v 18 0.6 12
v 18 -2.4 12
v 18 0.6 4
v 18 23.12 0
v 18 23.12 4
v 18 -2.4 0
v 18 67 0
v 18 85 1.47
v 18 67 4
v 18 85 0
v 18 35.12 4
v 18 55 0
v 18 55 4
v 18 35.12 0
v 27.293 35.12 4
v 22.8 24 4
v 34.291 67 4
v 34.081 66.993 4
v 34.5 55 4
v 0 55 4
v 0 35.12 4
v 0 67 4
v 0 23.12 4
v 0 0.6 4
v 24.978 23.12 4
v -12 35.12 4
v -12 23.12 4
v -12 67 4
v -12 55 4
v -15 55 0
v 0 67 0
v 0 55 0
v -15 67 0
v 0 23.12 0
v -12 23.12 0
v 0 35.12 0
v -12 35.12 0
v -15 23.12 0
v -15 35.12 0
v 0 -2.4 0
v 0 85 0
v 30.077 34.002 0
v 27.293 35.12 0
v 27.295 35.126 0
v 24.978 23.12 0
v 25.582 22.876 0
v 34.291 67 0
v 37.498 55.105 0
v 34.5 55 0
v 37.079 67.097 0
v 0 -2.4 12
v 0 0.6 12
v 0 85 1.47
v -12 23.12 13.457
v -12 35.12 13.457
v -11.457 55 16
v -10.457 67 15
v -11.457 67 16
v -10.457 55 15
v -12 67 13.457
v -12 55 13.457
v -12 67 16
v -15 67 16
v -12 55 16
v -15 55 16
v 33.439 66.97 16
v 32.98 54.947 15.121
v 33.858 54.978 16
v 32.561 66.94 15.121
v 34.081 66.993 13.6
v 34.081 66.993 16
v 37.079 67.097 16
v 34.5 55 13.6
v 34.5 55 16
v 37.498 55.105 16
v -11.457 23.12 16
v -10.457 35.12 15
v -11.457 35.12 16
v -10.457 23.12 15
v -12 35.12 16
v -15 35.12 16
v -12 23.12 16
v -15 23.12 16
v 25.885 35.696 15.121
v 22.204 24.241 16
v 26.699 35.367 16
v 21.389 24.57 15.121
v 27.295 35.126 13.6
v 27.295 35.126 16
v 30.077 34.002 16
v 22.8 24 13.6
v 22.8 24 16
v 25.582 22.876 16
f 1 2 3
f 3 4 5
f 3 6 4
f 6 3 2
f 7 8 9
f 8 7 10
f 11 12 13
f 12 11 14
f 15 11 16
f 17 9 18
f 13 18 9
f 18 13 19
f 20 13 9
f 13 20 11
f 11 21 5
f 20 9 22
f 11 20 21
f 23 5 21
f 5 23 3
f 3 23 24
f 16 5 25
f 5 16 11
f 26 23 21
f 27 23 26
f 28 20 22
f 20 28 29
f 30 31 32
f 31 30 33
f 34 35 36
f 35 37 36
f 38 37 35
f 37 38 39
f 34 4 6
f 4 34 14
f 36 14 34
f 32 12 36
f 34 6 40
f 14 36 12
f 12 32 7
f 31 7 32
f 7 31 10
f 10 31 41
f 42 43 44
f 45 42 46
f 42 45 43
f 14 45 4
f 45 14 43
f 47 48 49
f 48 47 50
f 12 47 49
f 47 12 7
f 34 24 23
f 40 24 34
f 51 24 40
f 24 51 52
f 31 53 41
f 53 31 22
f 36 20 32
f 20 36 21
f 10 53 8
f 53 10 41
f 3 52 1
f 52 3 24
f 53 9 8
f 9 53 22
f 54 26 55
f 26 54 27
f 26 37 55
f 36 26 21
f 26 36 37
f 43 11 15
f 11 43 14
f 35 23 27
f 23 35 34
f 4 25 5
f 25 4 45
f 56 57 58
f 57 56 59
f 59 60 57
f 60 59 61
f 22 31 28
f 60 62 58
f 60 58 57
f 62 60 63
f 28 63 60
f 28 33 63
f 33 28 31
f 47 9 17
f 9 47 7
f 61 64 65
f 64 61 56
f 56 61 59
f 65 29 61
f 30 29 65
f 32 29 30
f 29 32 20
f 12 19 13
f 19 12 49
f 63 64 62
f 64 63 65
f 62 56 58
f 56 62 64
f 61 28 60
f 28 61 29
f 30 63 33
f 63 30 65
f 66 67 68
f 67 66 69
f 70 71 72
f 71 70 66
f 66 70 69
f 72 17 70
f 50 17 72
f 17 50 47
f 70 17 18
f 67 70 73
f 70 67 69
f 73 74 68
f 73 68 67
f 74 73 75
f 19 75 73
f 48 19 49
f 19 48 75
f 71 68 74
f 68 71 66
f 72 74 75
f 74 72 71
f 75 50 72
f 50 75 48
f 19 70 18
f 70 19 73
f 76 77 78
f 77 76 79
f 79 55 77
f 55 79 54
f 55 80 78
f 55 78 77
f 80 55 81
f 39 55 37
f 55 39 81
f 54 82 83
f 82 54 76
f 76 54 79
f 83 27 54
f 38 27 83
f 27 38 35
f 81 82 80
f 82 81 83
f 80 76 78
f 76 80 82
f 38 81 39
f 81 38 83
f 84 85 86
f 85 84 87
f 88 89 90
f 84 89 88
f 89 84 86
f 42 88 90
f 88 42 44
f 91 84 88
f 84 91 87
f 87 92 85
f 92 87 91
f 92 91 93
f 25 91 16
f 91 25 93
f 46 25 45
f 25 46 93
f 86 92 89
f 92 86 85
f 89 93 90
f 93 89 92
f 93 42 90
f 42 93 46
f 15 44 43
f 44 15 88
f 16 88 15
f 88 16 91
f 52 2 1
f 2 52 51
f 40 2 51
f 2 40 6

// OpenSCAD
$fn = 90;

difference() {
    handle();

    #translate([-10, 46, 28]) rotate([180, 0, 180]) h();
    #translate([30, 46, 28]) rotate([180, 0, 180]) h();
}


module h() {
    translate([0,4,24]) {
        difference() {
            //rotate([-90,0,0]) import("Hook_single.stl");
            translate([0,11,-0.9]) cylinder(d = 2.5, h = 9);
            translate([0,0,-2]) {
                translate([0,11,-0.9]) cylinder(d = 3, h = 9);
                translate([0,11,8]) cylinder(d = 4.6, h = 10);
            }
        }
    }
}

module handle() {
    difference() {
        translate([0,0.6,0]) {
            cube([18, 84.4, 4]);
        }
        // Cut
        translate([-1,67,4]) rotate([-8,0,0]) cube([20, 24, 6]);
    }
    translate([-(36-12)/2, 55, 0]) cube([46.5, 12, 4]);
    
    difference() {
        translate([-(36-12)/2, 23.12, 0]) cube([39.3, 12, 4]);
        translate([23.61,18,-1]) rotate([0,0,-22]) cube([10, 10, 6]);
    }

    // Wide end
    translate([-15,55,0]) side(true);
    translate([34.5,55,0]) rotate([0,0,2]) side(false);
    
    // Short end
    translate([-15,23.12,0]) side(true);
    translate([22.8,24,0]) rotate([0,0,-22]) side(false);
    
    // Ending
    translate([0,-2.4,0]) cube([18, 3, 12]);
    
    //#translate([-(36-12)/2, 10, 10]) cube([32, 2, 2]);
}

module side(left = false) {
    cube([3, 12, 16]);
    difference() {
        translate([left ? 0.3 : 0.6, 0, left ? 15 : 13]) {
            rotate([0, left ? 45 : -45,0]) {
                cube([3, 12, 3]);
            }
        }
                
        translate([-2,-1,16]) cube([6, 14, 3]);
    }
}


module hole() {
    rotate([0, 0, 0]) {
        translate([0, 0, 3]) cylinder(d = 9.6, h = 5);
        translate([0, 0, -10]) cylinder(d = 5.2, h = 30);
        translate([0, 0, -4]) cylinder(d = 9.6, h = 5);
    }
}
